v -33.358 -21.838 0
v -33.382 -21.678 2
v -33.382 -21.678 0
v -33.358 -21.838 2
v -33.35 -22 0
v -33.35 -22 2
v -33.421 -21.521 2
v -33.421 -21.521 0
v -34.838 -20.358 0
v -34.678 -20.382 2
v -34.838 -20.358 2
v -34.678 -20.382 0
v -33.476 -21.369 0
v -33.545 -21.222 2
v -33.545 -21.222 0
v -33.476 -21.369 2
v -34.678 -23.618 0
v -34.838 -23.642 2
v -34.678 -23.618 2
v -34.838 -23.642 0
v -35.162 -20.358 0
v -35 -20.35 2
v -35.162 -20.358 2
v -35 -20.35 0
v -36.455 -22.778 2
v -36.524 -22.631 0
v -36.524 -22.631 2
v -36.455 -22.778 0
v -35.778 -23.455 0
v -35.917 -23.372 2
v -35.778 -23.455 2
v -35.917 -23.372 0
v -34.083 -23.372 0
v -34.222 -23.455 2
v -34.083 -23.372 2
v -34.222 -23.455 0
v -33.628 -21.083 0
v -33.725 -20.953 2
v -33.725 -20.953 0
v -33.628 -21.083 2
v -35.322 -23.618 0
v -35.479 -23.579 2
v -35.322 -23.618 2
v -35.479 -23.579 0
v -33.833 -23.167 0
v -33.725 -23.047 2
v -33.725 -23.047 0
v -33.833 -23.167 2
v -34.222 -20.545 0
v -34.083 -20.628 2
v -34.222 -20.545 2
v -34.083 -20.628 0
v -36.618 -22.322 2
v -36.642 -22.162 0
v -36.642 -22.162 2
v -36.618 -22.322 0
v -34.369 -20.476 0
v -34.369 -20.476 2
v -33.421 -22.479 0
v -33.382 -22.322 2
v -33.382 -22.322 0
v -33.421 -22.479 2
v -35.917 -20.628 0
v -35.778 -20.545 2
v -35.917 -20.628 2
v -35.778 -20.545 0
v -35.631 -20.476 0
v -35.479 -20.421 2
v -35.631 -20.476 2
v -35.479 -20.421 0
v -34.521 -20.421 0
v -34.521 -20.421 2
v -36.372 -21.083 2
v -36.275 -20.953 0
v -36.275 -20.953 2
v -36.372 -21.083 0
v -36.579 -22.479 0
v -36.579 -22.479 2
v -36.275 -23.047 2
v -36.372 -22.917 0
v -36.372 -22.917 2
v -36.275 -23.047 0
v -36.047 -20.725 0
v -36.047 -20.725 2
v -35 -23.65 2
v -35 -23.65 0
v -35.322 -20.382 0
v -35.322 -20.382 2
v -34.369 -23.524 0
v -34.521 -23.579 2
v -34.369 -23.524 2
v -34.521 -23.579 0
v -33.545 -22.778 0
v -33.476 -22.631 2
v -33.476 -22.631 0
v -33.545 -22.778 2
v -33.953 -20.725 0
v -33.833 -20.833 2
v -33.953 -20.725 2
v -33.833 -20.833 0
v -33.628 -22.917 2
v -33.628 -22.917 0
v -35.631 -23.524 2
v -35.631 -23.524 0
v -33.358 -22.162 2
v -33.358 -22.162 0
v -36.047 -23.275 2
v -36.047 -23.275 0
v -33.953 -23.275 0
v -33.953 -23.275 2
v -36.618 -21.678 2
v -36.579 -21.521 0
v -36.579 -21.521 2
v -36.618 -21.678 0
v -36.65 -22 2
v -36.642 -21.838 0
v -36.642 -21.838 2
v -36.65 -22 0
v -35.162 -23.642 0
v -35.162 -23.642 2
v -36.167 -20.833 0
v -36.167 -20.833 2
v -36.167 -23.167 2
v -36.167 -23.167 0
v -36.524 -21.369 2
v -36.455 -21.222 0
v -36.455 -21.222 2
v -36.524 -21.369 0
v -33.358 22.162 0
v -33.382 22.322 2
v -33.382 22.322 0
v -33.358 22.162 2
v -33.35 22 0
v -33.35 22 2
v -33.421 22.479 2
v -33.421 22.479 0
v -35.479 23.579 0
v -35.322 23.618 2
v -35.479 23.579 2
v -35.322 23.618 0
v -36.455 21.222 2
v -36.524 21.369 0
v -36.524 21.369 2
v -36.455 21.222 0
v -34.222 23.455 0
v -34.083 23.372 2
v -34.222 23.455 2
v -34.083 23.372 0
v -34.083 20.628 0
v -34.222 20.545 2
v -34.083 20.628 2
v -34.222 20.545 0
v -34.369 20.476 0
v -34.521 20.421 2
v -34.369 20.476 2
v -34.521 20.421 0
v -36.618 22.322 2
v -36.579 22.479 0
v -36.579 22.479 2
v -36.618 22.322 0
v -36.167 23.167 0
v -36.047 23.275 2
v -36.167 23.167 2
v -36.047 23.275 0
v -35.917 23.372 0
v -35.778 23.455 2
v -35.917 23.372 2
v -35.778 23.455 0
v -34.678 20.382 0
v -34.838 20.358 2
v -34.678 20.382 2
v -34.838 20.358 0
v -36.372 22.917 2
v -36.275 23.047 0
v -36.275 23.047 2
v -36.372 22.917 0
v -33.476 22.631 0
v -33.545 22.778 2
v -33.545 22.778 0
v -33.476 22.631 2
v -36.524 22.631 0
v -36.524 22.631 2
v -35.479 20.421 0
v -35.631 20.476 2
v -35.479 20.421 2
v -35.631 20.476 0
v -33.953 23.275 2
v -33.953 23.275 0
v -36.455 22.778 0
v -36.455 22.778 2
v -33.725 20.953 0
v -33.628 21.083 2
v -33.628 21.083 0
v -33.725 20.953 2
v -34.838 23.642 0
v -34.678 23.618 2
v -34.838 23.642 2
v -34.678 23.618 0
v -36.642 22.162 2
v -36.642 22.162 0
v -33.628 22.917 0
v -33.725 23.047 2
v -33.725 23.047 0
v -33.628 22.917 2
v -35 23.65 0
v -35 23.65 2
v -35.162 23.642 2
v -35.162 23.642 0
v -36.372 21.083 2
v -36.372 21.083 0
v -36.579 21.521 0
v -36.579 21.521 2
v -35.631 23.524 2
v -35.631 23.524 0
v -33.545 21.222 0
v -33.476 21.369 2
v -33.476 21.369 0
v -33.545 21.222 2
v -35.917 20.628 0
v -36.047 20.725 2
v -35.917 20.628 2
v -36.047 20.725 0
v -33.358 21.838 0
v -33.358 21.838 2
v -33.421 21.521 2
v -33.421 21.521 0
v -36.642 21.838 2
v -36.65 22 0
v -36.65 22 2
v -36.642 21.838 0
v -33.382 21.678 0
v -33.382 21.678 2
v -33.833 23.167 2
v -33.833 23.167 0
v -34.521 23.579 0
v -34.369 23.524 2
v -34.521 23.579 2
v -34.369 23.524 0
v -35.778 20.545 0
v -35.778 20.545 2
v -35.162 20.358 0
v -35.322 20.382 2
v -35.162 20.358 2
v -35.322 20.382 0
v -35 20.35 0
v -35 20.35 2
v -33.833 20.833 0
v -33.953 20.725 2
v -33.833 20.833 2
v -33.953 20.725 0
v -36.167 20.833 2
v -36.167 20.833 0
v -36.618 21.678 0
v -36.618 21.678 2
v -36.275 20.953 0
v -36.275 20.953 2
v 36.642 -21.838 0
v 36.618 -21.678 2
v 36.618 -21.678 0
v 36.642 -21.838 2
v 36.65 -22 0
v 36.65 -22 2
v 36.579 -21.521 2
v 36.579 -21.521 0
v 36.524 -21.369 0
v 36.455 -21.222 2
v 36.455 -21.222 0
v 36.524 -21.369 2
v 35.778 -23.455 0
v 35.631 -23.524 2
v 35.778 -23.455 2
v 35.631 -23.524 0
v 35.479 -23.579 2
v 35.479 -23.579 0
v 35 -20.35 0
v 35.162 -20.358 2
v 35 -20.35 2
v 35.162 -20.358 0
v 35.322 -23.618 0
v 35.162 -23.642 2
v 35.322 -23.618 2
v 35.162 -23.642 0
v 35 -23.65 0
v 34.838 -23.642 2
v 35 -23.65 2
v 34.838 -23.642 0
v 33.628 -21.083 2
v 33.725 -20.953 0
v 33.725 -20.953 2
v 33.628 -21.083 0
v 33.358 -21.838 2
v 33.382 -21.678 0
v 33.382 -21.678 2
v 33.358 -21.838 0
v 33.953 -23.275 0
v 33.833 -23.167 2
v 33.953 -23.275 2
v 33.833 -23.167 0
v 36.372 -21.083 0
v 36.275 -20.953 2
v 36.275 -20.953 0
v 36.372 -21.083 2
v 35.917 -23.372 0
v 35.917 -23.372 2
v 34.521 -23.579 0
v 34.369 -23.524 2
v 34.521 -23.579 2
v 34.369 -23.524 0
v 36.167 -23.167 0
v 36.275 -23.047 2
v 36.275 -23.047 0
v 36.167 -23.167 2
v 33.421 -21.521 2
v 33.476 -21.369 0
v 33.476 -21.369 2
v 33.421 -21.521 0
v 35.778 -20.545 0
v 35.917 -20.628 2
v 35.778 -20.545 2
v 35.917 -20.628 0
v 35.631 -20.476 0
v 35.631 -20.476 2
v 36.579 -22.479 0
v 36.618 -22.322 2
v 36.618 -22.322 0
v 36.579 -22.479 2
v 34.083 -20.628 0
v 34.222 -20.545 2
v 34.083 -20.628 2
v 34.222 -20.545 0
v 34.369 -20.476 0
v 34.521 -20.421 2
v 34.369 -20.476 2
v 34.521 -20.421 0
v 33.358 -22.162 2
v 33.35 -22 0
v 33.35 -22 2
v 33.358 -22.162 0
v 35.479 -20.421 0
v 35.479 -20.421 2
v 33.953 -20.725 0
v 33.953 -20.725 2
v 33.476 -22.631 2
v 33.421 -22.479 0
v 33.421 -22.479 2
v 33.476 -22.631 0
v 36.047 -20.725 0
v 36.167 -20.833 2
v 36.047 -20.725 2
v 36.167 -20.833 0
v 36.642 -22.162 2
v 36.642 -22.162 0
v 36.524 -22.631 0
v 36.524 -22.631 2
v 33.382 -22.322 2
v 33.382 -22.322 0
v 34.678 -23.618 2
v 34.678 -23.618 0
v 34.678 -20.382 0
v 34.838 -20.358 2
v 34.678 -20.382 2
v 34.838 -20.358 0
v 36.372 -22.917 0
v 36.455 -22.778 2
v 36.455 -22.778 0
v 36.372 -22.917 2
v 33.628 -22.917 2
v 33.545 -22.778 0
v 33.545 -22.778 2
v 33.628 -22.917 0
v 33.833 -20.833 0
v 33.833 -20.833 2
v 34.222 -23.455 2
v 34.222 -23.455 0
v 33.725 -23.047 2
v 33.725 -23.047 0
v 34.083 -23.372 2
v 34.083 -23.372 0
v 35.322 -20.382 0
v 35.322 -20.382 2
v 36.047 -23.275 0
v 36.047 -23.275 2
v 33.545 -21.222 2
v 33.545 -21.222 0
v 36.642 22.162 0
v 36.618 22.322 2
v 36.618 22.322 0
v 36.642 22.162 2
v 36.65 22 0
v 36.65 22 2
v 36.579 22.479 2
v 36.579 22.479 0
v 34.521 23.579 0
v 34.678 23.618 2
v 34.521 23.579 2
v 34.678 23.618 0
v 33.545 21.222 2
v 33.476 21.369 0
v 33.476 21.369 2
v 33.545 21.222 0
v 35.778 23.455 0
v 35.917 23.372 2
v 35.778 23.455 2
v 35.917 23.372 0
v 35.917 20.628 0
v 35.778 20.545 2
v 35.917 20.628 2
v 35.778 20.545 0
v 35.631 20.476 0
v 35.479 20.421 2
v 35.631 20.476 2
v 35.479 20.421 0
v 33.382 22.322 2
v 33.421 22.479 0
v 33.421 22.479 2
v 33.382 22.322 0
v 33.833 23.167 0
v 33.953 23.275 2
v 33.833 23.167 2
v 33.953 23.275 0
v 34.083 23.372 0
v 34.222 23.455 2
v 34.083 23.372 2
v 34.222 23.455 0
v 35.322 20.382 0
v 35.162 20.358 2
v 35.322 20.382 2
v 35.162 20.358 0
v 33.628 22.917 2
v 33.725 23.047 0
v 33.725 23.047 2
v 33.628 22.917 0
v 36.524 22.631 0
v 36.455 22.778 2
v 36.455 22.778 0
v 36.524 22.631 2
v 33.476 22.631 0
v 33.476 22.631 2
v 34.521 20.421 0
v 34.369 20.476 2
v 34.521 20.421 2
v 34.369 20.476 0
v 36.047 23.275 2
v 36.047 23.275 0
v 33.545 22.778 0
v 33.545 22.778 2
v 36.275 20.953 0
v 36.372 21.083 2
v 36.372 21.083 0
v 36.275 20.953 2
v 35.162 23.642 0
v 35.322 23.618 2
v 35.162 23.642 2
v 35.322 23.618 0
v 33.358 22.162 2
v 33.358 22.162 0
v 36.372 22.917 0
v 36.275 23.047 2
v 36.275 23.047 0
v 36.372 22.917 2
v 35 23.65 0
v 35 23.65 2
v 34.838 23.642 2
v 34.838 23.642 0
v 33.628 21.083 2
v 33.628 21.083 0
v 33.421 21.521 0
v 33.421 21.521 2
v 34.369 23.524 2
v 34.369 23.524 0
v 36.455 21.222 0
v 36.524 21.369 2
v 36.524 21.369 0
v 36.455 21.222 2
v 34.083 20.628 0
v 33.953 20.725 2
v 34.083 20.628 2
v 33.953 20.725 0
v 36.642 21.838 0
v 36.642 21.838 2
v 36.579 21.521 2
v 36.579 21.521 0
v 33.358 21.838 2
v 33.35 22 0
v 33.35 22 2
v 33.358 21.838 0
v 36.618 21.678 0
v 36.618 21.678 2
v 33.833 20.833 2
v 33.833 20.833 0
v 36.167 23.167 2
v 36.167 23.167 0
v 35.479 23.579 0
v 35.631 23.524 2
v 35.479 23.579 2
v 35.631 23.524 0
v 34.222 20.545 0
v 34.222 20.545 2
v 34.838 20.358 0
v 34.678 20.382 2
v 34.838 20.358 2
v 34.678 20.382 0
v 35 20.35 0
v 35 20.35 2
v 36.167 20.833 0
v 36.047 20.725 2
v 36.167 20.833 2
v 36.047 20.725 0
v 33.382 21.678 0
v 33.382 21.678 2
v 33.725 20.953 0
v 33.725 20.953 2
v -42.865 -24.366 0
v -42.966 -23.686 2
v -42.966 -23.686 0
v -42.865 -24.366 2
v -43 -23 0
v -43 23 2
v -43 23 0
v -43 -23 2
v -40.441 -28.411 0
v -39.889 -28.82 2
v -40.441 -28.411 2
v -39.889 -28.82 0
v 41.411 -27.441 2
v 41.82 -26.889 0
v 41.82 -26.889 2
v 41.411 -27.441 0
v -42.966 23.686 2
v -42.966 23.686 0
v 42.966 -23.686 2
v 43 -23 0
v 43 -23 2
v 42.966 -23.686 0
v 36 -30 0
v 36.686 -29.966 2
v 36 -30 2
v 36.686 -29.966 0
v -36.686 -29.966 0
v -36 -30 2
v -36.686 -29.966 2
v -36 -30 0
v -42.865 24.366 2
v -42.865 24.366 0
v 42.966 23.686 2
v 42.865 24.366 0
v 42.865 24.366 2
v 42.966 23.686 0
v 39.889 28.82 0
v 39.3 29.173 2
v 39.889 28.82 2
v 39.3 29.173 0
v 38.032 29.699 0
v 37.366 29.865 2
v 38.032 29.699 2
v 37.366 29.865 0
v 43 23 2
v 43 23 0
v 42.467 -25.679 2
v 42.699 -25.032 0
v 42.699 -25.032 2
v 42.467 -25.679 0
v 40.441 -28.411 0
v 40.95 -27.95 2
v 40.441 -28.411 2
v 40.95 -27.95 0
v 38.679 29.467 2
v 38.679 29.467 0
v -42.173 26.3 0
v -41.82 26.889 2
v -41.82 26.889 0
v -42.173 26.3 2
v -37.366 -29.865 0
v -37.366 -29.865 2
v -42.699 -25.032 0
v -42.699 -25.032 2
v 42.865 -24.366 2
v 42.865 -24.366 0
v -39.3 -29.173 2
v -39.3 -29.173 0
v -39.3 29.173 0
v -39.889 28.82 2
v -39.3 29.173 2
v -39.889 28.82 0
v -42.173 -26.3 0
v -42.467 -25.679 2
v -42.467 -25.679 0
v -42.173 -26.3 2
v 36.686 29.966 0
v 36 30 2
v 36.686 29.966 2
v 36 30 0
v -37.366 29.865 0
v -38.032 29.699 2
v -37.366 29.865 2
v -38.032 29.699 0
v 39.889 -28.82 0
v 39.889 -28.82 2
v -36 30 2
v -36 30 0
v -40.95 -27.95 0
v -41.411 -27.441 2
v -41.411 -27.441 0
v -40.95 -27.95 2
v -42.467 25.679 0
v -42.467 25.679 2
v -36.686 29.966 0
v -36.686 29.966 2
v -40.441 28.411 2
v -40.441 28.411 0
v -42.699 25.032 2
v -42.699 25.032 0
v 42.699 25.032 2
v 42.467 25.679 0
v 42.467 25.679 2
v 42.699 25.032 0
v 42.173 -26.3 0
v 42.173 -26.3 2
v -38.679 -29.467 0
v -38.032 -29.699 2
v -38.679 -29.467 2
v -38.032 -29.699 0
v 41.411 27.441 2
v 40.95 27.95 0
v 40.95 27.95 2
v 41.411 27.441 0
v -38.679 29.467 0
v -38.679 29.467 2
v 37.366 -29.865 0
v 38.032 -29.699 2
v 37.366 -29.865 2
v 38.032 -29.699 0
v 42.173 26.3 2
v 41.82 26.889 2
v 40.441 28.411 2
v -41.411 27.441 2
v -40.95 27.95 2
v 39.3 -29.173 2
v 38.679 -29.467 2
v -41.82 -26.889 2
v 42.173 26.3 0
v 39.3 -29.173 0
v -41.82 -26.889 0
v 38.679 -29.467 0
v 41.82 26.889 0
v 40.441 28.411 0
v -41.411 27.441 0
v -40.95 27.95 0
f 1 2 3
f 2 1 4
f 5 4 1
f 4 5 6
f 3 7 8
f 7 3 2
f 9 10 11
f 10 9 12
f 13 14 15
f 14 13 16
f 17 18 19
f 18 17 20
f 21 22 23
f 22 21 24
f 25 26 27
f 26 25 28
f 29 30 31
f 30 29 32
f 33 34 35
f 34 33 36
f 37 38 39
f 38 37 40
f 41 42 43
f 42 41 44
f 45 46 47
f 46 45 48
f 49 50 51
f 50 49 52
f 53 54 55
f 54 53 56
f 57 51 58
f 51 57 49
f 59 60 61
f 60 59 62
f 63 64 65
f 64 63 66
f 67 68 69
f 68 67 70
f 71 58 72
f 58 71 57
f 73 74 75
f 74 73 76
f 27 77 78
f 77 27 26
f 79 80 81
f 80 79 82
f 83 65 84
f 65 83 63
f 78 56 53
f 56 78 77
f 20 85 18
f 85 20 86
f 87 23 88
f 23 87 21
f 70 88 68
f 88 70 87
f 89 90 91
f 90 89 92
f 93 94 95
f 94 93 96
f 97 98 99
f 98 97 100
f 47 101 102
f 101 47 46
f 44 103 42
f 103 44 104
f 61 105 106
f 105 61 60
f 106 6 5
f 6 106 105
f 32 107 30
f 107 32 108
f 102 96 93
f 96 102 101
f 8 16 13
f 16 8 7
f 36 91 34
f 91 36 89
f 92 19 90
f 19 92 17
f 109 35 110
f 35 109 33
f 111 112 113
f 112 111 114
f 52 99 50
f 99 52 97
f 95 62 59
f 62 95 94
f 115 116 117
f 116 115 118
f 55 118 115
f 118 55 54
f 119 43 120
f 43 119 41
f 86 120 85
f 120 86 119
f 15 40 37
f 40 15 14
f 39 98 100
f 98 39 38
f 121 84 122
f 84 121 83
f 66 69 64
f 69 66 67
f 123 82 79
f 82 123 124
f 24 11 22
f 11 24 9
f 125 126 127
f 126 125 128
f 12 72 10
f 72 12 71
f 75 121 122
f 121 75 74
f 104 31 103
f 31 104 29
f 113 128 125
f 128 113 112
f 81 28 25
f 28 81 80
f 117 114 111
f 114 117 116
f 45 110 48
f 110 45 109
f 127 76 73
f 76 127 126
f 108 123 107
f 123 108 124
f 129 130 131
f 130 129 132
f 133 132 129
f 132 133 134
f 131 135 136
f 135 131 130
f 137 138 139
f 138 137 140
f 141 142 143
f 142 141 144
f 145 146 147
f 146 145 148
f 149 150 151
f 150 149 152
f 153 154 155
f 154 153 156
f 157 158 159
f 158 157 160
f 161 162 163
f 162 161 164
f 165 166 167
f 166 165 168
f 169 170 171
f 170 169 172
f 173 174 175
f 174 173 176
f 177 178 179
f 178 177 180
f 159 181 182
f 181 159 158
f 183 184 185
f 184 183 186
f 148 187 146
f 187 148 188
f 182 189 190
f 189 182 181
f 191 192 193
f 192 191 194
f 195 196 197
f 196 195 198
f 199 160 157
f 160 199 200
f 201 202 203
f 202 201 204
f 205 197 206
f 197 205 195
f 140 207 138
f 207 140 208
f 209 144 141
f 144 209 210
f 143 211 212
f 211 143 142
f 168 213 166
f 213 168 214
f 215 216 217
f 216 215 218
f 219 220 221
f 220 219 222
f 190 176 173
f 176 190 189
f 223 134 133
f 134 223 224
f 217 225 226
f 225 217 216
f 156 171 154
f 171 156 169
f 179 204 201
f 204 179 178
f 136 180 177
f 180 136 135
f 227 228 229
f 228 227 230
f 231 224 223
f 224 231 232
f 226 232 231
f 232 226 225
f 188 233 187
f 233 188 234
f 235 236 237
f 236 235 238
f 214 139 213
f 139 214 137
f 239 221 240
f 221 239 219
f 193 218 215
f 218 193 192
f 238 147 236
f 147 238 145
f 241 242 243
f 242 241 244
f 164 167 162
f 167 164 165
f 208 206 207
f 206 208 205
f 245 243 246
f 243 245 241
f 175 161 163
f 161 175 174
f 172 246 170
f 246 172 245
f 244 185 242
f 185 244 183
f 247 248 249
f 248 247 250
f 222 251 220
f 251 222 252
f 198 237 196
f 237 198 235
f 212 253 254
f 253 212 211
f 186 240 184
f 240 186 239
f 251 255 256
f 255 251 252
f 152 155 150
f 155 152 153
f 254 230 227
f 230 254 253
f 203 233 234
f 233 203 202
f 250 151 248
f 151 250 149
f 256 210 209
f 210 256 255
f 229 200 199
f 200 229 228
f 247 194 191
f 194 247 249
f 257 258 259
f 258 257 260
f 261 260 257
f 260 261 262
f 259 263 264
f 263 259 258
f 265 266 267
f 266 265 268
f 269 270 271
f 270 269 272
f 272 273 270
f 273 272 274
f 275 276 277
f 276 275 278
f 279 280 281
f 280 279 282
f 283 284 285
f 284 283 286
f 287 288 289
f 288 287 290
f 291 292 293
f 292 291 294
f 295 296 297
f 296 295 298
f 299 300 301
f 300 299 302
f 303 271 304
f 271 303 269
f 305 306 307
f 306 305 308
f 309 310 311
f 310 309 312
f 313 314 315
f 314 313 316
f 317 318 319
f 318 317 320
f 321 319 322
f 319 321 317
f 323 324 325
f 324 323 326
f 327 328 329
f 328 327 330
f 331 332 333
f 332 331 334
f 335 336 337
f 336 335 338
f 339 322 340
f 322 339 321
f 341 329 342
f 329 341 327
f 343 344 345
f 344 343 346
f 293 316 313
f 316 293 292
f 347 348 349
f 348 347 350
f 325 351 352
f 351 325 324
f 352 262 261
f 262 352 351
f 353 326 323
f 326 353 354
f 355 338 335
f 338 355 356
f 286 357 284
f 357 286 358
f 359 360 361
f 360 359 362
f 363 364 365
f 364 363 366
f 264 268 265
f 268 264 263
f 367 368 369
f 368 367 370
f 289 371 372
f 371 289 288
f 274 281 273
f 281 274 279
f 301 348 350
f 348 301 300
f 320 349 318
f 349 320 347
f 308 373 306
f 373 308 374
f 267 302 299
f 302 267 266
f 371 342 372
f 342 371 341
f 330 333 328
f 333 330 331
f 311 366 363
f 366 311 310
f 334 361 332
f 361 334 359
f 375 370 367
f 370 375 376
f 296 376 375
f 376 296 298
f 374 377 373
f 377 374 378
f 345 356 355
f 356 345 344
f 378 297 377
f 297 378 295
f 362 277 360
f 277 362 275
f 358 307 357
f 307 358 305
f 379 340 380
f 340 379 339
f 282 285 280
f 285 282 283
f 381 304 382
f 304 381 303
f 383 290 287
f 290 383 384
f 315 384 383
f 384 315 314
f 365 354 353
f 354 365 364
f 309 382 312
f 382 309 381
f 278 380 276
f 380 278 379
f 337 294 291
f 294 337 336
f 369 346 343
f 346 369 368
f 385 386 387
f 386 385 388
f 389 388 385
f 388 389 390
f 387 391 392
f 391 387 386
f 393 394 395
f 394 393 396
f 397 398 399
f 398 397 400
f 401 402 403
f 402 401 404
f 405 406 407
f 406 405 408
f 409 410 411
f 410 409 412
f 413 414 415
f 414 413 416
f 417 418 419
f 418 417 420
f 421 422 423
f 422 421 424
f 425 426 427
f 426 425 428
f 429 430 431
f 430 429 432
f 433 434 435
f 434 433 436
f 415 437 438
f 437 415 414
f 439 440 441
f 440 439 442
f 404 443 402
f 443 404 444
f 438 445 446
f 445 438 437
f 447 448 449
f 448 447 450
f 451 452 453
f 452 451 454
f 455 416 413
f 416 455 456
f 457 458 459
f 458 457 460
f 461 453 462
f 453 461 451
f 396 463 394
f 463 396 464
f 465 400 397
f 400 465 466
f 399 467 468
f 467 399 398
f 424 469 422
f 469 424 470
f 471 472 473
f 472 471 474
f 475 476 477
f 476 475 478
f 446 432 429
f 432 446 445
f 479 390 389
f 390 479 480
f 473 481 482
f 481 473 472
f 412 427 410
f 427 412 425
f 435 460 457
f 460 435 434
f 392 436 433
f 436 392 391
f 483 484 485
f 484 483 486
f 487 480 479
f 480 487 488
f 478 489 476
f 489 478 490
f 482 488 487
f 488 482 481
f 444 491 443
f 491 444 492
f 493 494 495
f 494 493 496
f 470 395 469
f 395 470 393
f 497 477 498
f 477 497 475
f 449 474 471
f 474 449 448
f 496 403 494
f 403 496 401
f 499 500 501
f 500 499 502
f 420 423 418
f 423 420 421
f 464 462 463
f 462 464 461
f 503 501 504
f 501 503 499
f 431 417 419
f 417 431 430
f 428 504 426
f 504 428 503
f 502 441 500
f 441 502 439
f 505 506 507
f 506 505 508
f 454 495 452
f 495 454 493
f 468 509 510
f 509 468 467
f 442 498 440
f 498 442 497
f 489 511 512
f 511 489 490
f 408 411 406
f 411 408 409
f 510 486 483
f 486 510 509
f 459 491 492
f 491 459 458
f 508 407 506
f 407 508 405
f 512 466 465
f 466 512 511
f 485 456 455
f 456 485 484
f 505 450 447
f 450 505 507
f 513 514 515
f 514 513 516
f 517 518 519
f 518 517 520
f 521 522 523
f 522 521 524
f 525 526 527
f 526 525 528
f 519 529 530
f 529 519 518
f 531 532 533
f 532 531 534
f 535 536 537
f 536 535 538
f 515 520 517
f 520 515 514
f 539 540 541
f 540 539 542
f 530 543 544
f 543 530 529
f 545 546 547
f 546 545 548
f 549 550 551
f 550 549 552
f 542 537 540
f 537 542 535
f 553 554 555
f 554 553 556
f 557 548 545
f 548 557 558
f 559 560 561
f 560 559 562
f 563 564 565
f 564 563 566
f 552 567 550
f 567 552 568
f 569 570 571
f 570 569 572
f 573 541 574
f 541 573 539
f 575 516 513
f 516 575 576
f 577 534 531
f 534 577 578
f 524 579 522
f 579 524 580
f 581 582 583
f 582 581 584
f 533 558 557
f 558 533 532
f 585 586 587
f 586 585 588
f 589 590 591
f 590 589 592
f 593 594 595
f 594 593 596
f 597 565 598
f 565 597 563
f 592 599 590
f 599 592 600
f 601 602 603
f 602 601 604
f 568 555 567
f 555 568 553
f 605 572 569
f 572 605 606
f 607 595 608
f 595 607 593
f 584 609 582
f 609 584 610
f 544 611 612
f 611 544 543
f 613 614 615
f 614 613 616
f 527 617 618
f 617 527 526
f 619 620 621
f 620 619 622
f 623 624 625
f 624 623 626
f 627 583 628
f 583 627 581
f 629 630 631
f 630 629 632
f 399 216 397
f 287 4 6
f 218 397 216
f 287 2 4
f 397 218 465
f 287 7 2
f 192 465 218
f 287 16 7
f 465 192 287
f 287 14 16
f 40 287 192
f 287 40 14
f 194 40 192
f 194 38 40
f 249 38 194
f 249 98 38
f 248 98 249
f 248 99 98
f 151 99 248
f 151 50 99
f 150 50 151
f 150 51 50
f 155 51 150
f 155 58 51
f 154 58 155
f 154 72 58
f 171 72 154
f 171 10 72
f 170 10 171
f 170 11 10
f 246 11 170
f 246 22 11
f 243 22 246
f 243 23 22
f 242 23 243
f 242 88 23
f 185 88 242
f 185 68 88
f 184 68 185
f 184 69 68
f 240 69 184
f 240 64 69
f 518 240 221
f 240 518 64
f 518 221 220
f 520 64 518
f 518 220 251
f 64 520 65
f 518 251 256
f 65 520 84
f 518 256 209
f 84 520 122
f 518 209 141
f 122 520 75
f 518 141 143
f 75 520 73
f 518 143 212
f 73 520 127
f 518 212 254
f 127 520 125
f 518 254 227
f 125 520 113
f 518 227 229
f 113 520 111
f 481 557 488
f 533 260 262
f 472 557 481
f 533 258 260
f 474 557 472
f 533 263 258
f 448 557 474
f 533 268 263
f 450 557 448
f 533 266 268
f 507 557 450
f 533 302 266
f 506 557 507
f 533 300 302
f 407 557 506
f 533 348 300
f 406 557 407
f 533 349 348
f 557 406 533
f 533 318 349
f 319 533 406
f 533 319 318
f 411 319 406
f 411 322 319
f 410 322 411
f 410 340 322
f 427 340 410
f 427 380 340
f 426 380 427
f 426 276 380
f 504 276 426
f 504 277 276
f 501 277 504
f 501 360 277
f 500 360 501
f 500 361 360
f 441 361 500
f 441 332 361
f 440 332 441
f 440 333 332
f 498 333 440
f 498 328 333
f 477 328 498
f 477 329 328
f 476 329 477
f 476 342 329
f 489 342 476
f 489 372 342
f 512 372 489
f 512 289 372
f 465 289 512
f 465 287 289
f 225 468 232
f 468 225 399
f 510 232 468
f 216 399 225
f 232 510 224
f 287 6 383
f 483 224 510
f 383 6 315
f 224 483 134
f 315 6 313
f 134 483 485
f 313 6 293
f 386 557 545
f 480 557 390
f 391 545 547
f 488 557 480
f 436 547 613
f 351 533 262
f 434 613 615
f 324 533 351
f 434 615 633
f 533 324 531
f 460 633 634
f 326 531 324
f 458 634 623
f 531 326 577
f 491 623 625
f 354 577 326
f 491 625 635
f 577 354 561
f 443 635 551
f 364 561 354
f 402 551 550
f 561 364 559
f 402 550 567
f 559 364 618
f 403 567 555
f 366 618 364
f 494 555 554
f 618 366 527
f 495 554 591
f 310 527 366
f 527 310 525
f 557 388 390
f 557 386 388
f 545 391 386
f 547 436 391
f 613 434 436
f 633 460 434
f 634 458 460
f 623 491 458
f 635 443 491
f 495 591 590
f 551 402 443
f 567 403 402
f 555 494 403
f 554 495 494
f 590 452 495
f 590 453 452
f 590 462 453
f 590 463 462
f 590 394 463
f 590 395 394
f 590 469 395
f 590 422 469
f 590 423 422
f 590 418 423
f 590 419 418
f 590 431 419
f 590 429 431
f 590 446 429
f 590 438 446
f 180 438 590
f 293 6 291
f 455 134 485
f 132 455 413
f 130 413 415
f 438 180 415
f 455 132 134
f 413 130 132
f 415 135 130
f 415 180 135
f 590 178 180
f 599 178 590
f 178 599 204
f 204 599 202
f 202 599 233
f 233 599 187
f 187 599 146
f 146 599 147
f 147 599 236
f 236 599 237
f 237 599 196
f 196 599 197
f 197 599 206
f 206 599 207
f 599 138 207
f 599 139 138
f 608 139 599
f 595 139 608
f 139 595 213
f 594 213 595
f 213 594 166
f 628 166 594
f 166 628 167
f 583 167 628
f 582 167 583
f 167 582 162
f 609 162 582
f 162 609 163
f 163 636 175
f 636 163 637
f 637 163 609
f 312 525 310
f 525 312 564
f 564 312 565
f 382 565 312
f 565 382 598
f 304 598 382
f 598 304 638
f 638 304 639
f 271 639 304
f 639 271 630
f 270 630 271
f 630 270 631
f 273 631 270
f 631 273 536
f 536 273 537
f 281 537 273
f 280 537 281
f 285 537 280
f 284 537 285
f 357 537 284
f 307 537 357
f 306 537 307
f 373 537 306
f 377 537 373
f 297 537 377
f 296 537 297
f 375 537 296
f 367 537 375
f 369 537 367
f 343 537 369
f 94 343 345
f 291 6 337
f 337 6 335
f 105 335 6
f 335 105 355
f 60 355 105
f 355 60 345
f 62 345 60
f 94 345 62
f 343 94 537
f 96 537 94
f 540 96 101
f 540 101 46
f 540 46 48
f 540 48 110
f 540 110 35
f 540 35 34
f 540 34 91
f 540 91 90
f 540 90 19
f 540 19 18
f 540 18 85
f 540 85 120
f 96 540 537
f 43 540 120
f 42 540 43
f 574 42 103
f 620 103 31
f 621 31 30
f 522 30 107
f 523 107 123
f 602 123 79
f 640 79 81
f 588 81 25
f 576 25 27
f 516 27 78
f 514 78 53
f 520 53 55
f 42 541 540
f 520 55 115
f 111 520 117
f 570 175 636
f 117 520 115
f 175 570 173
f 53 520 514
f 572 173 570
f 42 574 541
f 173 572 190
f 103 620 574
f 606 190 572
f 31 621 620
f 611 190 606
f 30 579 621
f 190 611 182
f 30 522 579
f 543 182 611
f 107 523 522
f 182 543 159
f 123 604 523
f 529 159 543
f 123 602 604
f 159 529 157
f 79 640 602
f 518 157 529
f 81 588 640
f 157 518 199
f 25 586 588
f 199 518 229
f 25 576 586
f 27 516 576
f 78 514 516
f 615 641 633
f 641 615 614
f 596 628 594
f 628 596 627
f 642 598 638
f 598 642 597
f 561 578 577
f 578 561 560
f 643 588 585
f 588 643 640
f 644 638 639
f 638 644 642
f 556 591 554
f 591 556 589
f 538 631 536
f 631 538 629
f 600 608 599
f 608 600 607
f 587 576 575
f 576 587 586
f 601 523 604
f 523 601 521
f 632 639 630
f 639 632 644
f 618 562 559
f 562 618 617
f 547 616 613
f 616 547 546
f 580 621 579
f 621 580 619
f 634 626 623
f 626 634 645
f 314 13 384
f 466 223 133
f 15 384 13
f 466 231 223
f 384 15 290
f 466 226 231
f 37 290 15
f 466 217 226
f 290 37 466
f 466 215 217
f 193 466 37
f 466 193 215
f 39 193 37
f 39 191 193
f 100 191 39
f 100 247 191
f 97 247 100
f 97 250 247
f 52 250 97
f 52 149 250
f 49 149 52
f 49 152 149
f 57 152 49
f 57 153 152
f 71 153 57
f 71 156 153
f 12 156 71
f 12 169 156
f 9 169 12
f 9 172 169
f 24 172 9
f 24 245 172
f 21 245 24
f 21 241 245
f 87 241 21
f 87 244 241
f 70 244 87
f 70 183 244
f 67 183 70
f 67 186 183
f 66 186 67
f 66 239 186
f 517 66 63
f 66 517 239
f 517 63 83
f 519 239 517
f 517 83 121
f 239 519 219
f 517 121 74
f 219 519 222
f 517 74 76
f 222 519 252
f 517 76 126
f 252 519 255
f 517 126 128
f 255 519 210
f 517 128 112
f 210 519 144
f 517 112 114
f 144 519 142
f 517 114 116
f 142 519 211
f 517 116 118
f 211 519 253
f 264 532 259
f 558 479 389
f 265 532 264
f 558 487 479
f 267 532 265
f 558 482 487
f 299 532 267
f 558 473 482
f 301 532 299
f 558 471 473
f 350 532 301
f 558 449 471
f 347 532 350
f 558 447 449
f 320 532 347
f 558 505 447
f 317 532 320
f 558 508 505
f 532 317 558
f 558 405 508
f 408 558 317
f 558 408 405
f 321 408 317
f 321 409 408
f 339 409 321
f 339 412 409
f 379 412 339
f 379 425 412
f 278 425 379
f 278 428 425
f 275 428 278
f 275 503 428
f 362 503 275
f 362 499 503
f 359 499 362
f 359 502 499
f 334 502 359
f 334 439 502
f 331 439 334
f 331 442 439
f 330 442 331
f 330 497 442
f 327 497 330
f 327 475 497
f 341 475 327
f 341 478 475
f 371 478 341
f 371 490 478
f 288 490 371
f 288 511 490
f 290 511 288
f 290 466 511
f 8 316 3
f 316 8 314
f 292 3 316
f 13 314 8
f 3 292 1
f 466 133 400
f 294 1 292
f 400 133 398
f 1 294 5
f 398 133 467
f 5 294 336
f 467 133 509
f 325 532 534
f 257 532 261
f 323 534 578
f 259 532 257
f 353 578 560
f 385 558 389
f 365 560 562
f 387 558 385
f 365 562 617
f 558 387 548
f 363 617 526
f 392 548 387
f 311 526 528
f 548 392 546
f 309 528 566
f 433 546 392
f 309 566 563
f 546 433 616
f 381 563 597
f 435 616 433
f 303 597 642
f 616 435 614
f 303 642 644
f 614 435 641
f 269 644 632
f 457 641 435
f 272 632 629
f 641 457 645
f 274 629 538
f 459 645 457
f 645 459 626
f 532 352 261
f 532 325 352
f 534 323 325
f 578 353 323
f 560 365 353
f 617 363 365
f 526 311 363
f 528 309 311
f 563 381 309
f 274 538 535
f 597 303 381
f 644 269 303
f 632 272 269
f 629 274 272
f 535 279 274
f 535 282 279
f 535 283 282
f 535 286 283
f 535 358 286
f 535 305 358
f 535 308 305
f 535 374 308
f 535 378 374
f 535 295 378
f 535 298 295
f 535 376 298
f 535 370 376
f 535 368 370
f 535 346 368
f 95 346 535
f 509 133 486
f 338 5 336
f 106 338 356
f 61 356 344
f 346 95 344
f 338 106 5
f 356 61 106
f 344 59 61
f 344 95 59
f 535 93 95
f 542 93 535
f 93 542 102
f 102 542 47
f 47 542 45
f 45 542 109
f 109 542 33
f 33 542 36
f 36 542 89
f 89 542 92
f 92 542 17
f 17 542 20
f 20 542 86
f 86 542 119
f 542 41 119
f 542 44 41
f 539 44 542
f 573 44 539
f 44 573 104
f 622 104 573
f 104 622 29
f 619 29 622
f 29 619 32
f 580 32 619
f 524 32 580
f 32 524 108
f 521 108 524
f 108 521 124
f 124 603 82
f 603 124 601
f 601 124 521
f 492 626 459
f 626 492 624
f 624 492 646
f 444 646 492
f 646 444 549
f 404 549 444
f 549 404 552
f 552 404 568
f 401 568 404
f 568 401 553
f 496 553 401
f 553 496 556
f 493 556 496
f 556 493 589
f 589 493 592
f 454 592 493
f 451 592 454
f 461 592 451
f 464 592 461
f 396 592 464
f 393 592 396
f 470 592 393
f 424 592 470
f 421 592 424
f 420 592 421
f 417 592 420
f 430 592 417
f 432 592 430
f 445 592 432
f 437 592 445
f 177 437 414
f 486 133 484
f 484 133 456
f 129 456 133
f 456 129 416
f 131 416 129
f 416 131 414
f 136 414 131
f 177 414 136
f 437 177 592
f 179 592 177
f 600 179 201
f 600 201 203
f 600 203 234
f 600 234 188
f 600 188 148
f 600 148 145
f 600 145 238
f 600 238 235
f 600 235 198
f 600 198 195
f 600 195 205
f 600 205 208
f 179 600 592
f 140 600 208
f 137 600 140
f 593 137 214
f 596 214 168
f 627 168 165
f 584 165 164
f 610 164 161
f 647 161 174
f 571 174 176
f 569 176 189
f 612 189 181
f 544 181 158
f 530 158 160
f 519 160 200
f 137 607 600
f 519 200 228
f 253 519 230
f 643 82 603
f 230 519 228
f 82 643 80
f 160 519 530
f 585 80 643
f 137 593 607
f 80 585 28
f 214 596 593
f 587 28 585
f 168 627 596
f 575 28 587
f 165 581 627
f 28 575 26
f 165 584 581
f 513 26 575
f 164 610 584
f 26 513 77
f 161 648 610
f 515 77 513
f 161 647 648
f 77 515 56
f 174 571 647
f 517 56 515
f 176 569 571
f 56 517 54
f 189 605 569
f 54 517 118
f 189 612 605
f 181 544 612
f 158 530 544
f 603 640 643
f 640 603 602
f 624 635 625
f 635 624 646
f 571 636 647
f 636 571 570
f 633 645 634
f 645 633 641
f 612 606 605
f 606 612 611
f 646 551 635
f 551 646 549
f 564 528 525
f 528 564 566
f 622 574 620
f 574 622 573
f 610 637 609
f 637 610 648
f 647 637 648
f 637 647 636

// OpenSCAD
// Millimetres. Render selected part (F6), then export STL.
// Demonstration sizing only: replace measured_neck with a measured circumference.
part = "lid"; // base, lid, strap, assembly, exploded
uno = false; // true: 108x78x32; false: reference 86x60x22
measured_neck = 0; // 0 means UNMEASURED
demo_neck = 900; // illustrative only, NOT a cattle average
fit_allowance = 40; // must be assessed for the animal
closure_allowance = 140; // must match chosen hardware
strap_width=32;
strap_thickness=2.5;
adjustment_pitch=15;
adjustment_holes=9;
sensor_slot_length=12;
sensor_slot_width=8;
sensor_slot_x=0;
sensor_slot_y=22; // off the central 32mm strap path
L=uno?108:86; W=uno?78:60; H=uno?32:22;
wall=2.4; floor=2.4; lid_thickness=2; B=H-lid_thickness;
C=(measured_neck>0?measured_neck:demo_neck)+fit_allowance;
blank_length=C+closure_allowance;
$fn=64;
module rounded(l,w,h,r) {
  linear_extrude(h) hull()
    for(x=[-l/2+r,l/2-r],y=[-w/2+r,w/2-r])
      translate([x,y]) circle(r);
}
module posts() { for(x=[-L/2+8,L/2-8],y=[-W/2+8,W/2-8]) translate([x,y,0]) children(); }
module base() {
  difference() {
    union() {
      difference() {
        rounded(L,W,B,7);
        translate([0,0,floor]) rounded(L-2*wall,W-2*wall,B,4.6);
      }
      posts() translate([0,0,floor]) cylinder(h=B-floor,r=4.5);
      for(x=[-L/2-4,L/2+4]) translate([x,0,0]) difference() {
        rounded(14,strap_width+12,4,4);
        translate([0,0,-1]) rounded(6,strap_width+2,6,2);
      }
    }
    posts() translate([0,0,B-10]) cylinder(h=11,r=1.25);
    translate([sensor_slot_x,sensor_slot_y,-1]) rounded(sensor_slot_length,sensor_slot_width,floor+2,1.5);
  }
}
module lid() { difference() {
  rounded(L,W,lid_thickness,7);
  posts() translate([0,0,-1]) cylinder(h=lid_thickness+2,r=1.65);
} }
module strap() { difference() {
  rounded(blank_length,strap_width,strap_thickness,6);
  for(i=[0:adjustment_holes-1]) translate([blank_length/2-20-i*adjustment_pitch,0,-1]) cylinder(h=strap_thickness+2,r=2.5);
} }
if(part=="base") base();
if(part=="lid") lid();
if(part=="strap") strap();
if(part=="exploded") { color("SlateGray") base(); color("LightBlue") translate([0,0,B+12]) lid(); }
if(part=="assembly") {
  // Visualization only: no functional buckle or release mechanism.
  R=C/(2*PI);
  color("Olive") difference() { cylinder(h=strap_width,r=R+strap_thickness); translate([0,0,-1]) cylinder(h=strap_width+2,r=R); }
  translate([0,-R-strap_thickness,strap_width/2]) rotate([90,0,0]) {
    color("SlateGray") base(); color("LightBlue") translate([0,0,B]) lid();
  }
}
